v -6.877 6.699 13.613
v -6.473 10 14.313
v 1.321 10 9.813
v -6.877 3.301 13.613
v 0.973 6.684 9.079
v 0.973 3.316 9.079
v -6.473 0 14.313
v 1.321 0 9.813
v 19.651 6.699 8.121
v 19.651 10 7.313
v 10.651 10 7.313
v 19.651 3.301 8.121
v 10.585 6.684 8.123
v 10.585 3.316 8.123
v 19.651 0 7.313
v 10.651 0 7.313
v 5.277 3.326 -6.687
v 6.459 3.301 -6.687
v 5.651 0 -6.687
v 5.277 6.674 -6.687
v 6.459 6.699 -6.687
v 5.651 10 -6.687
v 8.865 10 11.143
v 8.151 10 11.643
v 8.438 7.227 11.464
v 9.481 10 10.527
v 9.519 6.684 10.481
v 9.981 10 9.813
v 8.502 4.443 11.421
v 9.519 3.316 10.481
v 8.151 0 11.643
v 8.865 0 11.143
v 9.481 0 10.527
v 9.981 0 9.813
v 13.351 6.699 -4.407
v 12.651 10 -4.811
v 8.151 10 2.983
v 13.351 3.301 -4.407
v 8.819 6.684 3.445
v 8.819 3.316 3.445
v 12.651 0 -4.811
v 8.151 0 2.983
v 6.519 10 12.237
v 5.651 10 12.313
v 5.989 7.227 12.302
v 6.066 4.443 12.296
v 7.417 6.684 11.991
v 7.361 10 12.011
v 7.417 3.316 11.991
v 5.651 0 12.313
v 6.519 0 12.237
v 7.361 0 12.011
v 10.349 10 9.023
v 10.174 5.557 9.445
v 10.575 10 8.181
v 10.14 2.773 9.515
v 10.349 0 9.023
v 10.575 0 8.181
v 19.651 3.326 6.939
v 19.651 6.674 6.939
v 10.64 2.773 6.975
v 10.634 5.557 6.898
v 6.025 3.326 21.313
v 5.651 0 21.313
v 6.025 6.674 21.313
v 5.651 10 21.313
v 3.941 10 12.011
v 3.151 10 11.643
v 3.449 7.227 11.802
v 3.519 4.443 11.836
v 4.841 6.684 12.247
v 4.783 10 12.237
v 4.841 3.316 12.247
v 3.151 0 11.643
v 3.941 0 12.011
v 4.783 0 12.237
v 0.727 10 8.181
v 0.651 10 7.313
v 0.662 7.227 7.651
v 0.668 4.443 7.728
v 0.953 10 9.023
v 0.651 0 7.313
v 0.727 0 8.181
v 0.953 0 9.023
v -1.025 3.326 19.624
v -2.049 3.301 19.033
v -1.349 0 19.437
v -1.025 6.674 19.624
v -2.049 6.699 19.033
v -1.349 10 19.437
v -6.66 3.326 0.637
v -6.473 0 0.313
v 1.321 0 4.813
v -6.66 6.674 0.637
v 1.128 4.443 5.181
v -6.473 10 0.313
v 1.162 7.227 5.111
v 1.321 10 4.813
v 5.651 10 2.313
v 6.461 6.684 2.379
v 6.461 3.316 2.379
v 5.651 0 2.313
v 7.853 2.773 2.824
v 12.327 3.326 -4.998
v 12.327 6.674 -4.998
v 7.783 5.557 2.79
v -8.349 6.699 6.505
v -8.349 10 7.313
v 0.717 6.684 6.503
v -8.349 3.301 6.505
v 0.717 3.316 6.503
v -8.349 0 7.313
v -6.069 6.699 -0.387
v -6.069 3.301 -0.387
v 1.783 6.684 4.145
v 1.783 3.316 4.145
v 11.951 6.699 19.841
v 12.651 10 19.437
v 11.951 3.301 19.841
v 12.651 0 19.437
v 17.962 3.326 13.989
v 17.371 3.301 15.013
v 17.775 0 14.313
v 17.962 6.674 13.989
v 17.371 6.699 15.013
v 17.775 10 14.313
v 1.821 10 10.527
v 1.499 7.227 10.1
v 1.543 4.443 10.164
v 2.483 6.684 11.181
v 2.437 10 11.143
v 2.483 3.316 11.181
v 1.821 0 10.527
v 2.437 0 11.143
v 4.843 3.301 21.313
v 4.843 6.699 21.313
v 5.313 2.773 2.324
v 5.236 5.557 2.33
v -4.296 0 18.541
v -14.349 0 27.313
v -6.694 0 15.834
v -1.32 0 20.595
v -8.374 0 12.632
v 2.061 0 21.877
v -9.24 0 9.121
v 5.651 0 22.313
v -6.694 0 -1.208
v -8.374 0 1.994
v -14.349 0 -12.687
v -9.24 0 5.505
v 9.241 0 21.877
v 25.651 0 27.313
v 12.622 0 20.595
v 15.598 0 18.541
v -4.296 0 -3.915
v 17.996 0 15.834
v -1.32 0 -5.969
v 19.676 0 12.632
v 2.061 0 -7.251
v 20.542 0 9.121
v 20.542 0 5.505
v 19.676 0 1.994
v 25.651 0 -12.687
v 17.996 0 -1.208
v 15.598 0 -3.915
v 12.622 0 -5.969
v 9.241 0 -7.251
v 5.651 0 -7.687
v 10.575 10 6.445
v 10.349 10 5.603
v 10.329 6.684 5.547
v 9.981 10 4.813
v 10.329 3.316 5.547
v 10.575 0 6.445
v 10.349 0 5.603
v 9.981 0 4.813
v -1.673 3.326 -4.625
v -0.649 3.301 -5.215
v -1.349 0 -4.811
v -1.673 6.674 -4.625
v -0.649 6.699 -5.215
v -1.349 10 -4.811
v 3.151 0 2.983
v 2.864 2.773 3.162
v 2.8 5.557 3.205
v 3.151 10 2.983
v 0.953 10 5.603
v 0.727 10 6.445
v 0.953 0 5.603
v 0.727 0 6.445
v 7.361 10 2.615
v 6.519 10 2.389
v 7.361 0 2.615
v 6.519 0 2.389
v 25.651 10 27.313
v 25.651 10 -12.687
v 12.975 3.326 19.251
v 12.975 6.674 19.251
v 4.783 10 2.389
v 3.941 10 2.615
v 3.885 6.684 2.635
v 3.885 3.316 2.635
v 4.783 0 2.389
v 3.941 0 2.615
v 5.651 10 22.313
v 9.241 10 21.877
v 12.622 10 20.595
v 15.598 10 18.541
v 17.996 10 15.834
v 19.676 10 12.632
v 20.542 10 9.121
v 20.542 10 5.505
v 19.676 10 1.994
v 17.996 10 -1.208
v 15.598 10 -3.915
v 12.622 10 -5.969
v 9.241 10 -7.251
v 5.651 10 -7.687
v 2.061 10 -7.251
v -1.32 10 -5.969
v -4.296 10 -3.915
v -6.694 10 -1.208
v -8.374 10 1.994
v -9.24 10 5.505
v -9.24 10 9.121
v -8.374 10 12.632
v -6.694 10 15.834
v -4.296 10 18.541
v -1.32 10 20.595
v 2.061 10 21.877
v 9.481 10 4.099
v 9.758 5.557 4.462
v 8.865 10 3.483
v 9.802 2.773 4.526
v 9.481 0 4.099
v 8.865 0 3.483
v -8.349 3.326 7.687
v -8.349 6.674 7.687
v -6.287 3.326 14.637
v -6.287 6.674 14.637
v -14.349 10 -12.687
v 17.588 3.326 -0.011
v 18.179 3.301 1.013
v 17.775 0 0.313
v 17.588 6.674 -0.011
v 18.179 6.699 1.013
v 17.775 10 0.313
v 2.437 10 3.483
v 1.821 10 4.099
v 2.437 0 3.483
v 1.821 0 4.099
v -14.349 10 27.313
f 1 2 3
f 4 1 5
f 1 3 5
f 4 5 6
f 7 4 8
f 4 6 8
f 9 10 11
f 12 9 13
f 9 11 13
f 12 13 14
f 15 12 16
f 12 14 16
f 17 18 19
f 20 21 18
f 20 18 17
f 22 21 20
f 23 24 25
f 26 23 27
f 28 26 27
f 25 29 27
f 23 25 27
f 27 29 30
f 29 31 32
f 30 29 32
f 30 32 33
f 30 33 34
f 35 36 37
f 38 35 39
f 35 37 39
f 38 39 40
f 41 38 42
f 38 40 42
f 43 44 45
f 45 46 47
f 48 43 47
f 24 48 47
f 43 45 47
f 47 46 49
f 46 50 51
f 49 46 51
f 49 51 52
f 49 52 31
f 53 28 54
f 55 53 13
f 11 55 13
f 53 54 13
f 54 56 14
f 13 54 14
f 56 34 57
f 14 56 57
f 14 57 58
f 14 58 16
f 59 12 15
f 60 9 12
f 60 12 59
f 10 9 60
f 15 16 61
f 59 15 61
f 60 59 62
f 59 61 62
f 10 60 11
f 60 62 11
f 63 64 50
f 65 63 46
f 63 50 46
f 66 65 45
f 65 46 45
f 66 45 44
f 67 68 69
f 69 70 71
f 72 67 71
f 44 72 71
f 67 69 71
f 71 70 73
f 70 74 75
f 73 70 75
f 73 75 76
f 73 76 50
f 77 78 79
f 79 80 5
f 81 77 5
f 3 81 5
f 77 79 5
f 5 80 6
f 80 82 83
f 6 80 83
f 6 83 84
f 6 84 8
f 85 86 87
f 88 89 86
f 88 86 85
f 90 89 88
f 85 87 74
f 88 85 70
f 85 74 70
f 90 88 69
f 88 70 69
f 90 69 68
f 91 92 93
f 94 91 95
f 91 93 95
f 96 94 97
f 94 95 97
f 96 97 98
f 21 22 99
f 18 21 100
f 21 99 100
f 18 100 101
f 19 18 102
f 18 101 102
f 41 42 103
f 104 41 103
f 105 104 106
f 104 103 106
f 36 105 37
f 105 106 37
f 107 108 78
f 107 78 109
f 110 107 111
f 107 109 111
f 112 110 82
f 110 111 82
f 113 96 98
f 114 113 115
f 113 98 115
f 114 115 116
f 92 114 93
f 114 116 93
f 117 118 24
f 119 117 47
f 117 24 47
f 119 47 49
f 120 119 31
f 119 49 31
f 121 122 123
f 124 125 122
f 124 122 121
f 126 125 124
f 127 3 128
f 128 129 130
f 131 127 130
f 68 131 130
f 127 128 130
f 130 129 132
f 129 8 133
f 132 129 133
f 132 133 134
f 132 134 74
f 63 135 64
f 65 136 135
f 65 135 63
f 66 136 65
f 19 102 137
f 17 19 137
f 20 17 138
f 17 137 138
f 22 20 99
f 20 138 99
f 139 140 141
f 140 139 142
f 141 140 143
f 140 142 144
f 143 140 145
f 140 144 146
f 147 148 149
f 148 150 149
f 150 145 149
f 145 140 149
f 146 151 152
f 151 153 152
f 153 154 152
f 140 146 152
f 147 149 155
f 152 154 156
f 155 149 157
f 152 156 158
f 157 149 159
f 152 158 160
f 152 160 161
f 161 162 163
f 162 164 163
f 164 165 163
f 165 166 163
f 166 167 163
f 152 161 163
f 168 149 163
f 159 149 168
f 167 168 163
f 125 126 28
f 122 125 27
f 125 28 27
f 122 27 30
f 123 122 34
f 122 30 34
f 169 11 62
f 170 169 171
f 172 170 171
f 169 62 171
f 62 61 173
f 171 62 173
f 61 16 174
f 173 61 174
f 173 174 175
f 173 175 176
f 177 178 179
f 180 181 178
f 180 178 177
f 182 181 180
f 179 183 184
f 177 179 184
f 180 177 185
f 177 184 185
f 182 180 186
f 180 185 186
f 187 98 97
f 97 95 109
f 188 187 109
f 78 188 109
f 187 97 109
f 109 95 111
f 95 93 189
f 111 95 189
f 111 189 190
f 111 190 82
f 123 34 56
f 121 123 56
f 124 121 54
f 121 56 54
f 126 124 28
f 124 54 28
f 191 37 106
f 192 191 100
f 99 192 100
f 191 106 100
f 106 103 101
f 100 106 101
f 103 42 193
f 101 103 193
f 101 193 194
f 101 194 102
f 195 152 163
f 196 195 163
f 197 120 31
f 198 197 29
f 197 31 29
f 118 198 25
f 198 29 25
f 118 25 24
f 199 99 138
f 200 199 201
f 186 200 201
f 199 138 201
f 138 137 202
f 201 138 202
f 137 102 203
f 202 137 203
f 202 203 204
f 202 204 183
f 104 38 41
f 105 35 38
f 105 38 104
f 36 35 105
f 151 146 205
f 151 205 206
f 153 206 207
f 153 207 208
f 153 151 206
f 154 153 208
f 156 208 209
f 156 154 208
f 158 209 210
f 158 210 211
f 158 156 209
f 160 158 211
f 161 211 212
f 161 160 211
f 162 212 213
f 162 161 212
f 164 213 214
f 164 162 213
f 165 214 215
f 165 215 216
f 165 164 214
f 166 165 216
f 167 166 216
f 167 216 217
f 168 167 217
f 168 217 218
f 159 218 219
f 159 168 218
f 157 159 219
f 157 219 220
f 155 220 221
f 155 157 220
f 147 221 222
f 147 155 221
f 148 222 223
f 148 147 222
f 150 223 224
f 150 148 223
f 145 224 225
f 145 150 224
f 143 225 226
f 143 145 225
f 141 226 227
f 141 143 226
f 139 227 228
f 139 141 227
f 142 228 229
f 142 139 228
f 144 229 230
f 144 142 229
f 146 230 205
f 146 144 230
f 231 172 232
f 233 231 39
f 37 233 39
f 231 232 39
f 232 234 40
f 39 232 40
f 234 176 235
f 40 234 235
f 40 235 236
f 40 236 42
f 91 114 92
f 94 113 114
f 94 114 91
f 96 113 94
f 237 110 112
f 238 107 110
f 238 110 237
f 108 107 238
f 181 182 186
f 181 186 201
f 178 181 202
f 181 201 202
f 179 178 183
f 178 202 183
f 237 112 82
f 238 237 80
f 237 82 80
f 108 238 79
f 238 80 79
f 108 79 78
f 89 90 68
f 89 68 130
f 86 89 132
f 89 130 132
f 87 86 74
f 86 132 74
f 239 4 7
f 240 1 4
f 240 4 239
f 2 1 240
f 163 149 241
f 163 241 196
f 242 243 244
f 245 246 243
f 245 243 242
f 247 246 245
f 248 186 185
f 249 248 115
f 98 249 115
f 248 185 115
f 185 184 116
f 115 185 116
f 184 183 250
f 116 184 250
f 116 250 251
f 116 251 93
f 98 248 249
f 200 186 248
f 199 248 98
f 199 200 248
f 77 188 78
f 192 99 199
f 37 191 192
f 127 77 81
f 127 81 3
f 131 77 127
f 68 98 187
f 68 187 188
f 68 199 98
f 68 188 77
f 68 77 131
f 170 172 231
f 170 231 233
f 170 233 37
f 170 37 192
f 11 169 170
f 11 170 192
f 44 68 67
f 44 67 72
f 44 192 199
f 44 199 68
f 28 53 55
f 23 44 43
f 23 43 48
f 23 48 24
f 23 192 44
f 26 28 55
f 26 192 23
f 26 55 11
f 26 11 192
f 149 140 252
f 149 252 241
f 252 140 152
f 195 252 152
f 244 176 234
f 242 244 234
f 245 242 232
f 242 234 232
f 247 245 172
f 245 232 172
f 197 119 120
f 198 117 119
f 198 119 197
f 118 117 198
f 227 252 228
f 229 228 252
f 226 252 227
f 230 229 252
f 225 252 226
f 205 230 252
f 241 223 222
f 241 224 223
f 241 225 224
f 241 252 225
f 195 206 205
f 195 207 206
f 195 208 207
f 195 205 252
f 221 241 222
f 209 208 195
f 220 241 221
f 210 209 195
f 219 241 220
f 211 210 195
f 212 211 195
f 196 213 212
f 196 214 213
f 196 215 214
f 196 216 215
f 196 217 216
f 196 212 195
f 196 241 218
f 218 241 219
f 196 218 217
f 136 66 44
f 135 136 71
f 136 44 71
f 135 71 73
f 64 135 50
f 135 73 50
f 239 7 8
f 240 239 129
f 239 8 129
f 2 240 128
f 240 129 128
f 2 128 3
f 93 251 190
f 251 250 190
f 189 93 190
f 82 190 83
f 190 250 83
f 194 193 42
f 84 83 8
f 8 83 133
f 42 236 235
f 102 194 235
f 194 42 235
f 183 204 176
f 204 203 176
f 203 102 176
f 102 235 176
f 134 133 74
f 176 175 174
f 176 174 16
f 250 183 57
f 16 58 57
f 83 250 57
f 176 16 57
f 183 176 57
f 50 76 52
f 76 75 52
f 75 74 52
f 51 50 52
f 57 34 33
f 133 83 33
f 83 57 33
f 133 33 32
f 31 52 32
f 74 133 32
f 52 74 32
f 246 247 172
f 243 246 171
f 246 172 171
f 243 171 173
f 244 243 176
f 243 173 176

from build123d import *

# Parameters (mm, degrees)
SKETCH_1_W               = 40
SKETCH_1_H               = 40
SKETCH_1_R               = 15
EXTRUDE_1_DEPTH          = 10
SKETCH_1_R_2             = 5
EXTRUDE_1_2_DEPTH        = 10
EXTRUDE_2_DEPTH          = 14
PATTERN_CIRCULAR_1_COUNT = 12


with BuildPart() as part:
    # 草图1 → 凸台-拉伸1 (new body)
    with BuildSketch(Plane(origin=(0, 0, 0), x_dir=(1, 0, 0), z_dir=(0, 1, 0))):
        with Locations((5.650969529, -7.313019391)):
            Rectangle(SKETCH_1_W, SKETCH_1_H)
        with Locations(Location((5.650969529, -7.313019391, 0), (0, 0, 270))):
            Circle(SKETCH_1_R, mode=Mode.SUBTRACT)
    extrude(amount=EXTRUDE_1_DEPTH)


with BuildPart() as body_2:
    # 草图1 → Extrude 1 2 (new body)
    with BuildSketch(Plane(origin=(0, 0, 0), x_dir=(1, 0, 0), z_dir=(0, 1, 0))):
        with Locations(Location((5.650969529, -7.313019391, 0), (0, 0, 270))):
            Circle(SKETCH_1_R_2)
    extrude(amount=EXTRUDE_1_2_DEPTH)

    # 草图2 → 凸台-拉伸2 (add)
    with BuildSketch(Plane.ZY.offset(-5.650969529)):
        with BuildLine():
            ThreePointArc((7.313019391, 10), (6.403068689, 5), (7.313019391, 0))
            ThreePointArc((7.313019391, 0), (7.733487975, 5), (7.313019391, 10))
        make_face()
    extrude_2 = extrude(amount=EXTRUDE_2_DEPTH)

    # 阵列(圆周)1: 凸台-拉伸2 ×12 about axis
    pattern_circular_1_axis = Axis((5.650969529, 0, 7.313019391), (0, 1, 0))
    for i in range(1, PATTERN_CIRCULAR_1_COUNT):
        add(extrude_2.rotate(pattern_circular_1_axis, i * 360 / PATTERN_CIRCULAR_1_COUNT))


solid = Compound([part.part, body_2.part])
